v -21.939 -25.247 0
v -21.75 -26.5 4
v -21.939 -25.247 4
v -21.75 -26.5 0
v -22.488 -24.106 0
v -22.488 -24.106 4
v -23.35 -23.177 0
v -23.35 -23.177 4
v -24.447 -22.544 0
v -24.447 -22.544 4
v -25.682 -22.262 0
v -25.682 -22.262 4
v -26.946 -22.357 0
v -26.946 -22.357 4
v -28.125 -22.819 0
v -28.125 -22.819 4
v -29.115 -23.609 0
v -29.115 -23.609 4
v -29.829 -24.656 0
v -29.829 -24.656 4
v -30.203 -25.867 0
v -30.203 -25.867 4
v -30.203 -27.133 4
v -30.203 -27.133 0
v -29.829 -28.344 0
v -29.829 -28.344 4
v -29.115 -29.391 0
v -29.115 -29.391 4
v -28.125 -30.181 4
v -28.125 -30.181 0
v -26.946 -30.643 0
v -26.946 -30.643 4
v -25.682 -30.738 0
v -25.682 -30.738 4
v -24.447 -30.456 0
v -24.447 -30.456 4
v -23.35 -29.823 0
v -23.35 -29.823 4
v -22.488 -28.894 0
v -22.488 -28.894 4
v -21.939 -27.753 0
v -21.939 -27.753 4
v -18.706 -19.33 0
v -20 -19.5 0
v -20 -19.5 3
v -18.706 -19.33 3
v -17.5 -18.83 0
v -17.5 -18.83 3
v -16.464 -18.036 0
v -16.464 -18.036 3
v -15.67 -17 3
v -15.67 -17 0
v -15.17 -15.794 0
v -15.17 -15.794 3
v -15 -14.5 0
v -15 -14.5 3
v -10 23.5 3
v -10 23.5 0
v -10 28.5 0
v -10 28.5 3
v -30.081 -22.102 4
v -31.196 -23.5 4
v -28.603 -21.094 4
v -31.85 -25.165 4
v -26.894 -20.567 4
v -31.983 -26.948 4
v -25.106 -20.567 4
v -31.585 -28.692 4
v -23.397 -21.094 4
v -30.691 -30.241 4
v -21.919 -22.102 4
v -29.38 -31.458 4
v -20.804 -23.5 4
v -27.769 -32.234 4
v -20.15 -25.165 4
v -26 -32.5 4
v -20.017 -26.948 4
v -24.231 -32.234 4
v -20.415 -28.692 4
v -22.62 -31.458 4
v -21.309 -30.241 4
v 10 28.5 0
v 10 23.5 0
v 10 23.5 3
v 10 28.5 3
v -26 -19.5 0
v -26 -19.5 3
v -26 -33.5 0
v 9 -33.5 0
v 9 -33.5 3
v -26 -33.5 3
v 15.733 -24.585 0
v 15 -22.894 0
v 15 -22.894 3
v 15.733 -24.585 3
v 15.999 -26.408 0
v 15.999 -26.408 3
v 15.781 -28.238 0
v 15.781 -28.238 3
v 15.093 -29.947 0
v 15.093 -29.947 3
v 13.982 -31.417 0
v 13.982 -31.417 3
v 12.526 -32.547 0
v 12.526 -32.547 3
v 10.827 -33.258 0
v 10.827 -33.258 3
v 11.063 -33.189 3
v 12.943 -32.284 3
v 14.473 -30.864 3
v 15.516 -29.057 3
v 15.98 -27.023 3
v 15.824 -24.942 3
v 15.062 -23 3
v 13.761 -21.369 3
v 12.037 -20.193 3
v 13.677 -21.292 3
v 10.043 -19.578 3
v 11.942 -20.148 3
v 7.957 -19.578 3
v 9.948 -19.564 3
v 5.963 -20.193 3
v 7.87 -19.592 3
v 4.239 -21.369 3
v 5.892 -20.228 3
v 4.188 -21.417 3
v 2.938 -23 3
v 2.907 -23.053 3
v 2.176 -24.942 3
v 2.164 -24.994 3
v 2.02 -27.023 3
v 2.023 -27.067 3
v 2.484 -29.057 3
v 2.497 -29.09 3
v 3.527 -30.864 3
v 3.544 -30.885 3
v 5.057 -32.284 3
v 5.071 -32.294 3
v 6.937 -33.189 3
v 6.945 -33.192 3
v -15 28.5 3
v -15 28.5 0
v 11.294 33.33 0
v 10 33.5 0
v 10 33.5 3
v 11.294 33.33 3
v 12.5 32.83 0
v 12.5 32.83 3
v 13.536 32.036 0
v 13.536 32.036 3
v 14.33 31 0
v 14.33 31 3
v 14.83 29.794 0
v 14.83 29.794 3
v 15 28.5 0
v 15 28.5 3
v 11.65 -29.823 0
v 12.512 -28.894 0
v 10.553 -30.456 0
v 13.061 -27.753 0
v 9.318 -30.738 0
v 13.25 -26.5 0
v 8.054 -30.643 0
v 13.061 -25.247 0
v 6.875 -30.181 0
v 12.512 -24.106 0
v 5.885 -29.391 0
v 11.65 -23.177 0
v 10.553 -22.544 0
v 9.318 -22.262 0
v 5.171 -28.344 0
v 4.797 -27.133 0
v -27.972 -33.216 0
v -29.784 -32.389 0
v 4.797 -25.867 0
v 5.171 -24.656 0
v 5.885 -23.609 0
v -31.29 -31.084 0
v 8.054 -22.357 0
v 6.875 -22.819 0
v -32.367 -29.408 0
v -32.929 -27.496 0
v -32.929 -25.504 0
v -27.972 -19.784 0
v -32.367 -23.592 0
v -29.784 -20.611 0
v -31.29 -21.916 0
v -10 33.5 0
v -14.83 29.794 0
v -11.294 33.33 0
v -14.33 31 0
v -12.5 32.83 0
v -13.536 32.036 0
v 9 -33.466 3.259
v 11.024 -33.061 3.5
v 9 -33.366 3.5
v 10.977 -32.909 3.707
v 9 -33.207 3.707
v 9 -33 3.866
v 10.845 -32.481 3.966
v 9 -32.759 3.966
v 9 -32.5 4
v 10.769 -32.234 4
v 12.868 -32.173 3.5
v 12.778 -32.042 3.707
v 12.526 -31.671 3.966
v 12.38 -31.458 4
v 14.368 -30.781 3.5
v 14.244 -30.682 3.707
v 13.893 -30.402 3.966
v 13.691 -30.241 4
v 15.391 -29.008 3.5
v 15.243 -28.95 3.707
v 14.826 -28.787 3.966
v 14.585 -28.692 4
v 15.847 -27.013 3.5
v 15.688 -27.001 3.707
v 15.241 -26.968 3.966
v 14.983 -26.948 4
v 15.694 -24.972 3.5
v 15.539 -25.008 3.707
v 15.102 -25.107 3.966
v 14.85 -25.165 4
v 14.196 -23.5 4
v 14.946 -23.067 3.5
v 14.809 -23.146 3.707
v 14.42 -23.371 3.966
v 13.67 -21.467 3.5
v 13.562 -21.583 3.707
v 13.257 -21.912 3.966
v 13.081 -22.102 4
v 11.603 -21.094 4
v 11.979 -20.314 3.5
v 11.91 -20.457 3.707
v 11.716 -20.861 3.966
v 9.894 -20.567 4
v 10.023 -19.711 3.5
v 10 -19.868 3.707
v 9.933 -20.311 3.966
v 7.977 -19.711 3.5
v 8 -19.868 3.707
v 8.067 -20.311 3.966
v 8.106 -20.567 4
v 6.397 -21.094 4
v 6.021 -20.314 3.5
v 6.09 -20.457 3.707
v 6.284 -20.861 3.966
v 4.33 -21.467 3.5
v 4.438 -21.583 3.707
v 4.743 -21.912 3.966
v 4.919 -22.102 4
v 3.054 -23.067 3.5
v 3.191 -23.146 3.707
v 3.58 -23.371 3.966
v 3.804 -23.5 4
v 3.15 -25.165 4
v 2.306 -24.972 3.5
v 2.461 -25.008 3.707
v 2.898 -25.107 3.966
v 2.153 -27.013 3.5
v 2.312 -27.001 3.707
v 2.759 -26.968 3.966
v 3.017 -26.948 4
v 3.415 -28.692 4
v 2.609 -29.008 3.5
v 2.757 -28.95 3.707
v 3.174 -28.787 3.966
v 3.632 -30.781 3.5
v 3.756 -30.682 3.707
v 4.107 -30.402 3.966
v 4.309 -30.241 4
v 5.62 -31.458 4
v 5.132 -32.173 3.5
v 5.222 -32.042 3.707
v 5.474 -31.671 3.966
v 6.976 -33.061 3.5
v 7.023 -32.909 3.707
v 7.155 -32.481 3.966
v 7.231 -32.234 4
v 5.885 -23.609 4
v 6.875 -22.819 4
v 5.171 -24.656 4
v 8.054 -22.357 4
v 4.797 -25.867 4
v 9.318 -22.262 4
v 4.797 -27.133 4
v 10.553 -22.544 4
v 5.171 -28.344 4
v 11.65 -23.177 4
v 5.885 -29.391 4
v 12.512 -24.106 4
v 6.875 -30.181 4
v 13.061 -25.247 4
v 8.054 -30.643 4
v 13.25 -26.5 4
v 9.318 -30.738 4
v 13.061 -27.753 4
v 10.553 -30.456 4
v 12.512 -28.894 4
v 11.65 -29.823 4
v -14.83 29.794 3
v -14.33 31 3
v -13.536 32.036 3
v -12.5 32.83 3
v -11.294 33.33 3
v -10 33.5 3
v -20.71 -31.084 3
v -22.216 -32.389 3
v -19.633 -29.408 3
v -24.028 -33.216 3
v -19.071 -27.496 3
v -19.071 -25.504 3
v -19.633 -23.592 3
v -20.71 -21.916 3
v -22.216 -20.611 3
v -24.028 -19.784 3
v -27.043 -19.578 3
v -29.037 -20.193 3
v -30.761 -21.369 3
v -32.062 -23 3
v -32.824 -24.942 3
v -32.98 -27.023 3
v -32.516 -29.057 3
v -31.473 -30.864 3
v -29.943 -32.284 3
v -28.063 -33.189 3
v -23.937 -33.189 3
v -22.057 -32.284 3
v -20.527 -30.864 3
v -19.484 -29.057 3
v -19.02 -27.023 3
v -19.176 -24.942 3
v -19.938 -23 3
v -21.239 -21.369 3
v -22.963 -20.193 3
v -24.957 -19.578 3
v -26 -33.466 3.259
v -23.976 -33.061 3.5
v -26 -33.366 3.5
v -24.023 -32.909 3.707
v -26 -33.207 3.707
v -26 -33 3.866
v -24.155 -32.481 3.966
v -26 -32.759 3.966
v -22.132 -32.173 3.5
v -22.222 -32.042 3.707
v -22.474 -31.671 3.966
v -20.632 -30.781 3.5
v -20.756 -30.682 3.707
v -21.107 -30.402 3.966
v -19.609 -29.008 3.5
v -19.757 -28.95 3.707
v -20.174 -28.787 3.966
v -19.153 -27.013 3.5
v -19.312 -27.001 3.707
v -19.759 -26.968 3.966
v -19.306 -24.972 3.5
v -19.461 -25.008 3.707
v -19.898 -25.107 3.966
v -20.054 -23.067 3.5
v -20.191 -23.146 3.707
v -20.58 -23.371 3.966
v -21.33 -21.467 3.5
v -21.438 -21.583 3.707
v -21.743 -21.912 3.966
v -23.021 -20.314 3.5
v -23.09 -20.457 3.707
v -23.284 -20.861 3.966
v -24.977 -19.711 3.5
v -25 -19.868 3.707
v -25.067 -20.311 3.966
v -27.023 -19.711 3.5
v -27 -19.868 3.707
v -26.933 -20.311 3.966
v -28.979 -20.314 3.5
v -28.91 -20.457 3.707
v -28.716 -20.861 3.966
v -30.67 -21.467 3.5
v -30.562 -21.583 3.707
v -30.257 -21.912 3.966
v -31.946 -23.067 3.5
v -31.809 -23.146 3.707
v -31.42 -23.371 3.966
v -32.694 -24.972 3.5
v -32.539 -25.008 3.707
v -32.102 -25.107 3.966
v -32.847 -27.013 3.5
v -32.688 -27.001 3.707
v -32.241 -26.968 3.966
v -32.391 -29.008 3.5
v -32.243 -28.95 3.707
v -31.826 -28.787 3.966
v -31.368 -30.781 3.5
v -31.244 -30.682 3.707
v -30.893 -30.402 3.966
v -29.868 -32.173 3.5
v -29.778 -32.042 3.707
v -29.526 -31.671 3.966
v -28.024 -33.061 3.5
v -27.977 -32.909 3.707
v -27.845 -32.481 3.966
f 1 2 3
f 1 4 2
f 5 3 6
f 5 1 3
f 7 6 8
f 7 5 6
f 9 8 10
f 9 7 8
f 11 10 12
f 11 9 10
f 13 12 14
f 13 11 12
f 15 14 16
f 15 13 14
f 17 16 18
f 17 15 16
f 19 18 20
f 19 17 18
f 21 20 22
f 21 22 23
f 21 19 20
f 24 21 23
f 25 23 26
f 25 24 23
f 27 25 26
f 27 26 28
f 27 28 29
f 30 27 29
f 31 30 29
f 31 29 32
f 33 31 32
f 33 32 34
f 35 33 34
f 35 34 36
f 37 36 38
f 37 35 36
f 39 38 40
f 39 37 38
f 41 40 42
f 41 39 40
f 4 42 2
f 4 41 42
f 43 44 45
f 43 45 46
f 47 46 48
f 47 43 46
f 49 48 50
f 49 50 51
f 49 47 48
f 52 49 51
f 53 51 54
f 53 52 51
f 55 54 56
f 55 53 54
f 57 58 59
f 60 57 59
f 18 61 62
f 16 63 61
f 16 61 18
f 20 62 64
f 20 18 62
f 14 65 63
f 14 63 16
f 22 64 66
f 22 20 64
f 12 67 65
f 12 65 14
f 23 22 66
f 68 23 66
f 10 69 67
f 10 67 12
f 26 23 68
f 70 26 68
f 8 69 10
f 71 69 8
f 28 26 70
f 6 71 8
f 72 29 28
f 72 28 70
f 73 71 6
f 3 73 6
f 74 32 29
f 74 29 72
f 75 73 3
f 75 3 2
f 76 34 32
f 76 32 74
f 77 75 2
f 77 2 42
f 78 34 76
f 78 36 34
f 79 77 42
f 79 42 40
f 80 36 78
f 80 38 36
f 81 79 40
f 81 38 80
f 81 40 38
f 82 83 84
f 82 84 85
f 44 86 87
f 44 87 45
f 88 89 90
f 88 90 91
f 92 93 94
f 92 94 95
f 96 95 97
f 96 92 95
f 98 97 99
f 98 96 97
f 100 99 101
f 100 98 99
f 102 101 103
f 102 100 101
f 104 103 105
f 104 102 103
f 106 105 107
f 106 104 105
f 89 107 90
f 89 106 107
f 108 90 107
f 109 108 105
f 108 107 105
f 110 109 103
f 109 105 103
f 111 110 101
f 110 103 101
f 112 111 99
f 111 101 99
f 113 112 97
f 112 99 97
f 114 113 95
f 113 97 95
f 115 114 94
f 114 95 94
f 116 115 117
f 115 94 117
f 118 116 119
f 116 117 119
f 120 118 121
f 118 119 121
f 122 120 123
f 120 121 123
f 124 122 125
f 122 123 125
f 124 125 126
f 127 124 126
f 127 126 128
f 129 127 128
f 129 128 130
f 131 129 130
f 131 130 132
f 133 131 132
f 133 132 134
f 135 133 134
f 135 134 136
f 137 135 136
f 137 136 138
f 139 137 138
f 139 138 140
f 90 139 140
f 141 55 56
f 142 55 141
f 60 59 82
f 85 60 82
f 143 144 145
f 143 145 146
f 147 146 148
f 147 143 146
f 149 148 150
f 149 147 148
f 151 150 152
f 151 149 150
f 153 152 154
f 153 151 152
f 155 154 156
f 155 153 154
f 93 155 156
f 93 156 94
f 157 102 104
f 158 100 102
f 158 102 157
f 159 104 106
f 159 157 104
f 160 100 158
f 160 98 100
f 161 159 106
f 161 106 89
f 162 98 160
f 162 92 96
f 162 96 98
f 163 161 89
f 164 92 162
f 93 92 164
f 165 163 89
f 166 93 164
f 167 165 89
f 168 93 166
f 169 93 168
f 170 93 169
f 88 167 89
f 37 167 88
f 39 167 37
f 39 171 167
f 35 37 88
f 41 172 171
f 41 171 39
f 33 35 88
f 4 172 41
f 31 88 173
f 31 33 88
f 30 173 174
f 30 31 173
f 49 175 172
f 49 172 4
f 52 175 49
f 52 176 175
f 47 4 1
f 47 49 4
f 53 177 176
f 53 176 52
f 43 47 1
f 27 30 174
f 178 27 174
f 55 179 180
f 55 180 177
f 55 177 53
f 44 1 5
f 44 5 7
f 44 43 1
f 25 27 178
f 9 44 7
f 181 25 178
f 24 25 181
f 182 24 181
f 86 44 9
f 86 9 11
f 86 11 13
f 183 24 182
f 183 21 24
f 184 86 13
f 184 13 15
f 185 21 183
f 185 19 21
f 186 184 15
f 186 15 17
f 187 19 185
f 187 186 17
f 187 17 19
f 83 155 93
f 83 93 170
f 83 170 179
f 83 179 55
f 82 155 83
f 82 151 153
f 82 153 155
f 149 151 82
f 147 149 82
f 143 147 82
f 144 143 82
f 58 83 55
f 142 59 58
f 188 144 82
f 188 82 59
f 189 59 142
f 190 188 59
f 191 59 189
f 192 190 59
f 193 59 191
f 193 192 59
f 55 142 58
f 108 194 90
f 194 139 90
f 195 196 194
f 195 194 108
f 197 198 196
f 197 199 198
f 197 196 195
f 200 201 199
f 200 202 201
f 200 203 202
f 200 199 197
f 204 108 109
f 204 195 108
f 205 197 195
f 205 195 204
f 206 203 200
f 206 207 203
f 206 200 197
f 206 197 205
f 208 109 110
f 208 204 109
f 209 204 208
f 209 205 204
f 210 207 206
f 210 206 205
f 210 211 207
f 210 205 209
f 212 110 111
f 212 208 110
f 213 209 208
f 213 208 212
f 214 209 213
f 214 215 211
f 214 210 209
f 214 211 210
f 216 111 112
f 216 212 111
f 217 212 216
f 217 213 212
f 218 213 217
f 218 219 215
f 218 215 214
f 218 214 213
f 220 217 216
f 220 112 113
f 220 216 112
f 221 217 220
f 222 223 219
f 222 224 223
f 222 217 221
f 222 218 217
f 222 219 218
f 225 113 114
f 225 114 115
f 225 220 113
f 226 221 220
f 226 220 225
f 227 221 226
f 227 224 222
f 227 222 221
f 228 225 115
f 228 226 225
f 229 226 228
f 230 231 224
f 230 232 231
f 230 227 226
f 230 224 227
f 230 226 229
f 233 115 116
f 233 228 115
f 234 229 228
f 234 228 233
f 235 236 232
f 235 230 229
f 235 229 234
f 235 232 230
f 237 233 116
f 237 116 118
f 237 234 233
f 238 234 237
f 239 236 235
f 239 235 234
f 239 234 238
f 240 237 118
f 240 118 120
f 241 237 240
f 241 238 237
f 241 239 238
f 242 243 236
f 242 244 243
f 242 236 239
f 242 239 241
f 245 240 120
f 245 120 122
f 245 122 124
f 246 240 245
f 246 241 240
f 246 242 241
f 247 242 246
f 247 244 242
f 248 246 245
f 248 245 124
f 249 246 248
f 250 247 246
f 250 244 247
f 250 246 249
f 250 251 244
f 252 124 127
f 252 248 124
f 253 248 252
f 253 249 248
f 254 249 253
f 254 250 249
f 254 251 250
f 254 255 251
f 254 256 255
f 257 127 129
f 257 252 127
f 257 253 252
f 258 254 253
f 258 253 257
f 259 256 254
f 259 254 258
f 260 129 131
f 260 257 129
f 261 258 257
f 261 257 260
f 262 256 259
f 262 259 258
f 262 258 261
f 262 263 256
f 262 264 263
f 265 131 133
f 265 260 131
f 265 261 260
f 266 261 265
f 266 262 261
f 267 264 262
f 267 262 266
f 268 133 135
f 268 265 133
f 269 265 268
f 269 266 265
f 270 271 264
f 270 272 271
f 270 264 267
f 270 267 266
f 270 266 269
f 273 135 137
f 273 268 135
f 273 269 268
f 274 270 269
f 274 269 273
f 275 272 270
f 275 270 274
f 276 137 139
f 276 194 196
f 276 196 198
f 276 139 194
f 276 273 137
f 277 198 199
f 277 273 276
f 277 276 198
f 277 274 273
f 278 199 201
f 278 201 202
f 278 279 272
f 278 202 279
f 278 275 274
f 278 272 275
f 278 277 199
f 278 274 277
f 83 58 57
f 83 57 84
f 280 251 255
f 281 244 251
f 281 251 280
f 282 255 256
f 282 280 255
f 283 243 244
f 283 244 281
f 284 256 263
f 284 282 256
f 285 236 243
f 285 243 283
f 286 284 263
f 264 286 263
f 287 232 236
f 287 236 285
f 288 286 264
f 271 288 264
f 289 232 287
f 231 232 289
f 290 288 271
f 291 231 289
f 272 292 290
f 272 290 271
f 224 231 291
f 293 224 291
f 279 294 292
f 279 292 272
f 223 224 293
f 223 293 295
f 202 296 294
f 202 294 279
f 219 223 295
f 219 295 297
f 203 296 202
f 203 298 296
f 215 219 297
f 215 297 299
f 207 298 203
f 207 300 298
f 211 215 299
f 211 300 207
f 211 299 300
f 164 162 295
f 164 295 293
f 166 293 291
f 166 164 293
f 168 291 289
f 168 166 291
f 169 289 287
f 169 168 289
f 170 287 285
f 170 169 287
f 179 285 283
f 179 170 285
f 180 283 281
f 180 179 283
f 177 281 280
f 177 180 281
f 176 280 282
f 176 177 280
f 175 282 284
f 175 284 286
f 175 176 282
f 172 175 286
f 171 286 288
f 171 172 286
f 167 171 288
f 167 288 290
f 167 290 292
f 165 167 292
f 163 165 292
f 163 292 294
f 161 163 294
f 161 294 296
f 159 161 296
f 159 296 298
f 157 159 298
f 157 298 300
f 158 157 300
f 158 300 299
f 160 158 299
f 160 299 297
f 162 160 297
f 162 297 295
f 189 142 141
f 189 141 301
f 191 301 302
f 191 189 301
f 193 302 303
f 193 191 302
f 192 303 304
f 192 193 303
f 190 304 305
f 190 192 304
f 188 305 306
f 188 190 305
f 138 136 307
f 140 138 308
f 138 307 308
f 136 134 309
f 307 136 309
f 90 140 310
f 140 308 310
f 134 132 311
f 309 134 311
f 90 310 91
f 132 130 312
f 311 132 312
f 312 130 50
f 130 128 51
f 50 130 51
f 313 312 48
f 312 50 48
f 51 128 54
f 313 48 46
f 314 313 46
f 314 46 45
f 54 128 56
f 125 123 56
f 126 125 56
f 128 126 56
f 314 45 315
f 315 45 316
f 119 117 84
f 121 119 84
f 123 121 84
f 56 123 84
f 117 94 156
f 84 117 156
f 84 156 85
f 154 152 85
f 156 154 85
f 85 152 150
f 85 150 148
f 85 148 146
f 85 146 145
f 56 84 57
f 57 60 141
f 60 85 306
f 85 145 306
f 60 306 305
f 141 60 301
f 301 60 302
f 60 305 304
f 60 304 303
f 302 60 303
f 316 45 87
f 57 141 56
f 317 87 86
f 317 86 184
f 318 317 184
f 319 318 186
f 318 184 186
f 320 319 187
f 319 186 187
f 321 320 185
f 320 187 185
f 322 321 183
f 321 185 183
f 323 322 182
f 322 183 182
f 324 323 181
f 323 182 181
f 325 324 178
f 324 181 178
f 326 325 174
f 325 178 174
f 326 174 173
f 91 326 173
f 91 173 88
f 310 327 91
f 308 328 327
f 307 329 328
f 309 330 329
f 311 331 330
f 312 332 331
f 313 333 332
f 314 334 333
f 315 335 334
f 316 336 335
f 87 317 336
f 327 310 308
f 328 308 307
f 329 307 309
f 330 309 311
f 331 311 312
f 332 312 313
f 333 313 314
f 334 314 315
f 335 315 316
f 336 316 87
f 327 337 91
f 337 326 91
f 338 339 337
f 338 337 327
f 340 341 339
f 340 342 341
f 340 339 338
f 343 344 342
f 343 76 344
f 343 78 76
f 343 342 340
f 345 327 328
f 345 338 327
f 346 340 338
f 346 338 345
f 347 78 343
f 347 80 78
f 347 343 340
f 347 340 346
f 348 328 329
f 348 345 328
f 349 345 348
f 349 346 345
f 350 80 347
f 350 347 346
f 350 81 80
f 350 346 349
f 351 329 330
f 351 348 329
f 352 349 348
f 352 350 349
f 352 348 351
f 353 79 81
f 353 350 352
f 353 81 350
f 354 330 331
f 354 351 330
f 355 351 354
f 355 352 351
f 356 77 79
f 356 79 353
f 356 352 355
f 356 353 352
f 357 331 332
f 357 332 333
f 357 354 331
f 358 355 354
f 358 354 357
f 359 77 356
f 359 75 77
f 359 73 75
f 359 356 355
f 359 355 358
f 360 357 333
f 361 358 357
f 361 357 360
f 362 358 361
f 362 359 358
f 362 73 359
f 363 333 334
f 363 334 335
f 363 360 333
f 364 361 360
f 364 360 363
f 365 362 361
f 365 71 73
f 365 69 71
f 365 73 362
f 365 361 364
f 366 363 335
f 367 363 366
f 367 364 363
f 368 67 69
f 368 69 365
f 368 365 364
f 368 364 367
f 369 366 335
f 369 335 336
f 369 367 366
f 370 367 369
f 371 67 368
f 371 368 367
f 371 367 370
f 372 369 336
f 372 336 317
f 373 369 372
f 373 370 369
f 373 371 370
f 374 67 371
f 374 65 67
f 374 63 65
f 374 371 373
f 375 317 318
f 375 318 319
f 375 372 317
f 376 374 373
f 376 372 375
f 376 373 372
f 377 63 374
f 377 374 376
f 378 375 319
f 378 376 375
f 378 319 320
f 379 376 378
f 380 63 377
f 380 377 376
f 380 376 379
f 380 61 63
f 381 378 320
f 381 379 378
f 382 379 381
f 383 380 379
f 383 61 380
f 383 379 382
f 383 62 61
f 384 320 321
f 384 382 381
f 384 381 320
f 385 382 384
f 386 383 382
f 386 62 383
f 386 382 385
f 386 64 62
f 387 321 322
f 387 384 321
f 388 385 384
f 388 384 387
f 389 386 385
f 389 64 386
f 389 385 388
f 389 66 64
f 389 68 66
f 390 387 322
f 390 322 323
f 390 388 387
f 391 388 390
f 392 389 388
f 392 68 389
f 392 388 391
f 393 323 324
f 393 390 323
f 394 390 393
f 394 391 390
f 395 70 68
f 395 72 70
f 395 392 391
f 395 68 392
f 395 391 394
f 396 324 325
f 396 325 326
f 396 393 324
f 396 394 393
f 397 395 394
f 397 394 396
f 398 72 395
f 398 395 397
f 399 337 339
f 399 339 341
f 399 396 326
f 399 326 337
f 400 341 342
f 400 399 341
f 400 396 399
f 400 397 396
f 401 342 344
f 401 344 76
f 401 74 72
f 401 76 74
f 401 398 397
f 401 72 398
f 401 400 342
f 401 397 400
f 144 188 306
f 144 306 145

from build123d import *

# Parameters (mm, degrees)
SKETCH1_R           = 4.25
SKETCH1_W           = 20
SKETCH1_H           = 5
BOSS_EXTRUDE1_DEPTH = 3
SKETCH2_R           = 7
SKETCH2_R_2         = 4.25
BOSS_EXTRUDE2_DEPTH = 1
FILLET1_R           = 1


with BuildPart() as part:
    # Sketch1 → Boss-Extrude1 (new body)
    with BuildSketch(Plane.XY):
        with BuildLine():
            Line((9, -33.5), (-26, -33.5))
            ThreePointArc((-26, -33.5), (-33, -26.5), (-26, -19.5))
            Line((-26, -19.5), (-20, -19.5))
            ThreePointArc((-20, -19.5), (-16.464466094, -18.035533906), (-15, -14.5))
            Line((-15, -14.5), (-15, 28.5))
            ThreePointArc((-15, 28.5), (-13.535533906, 32.035533906), (-10, 33.5))
            Line((-10, 33.5), (10, 33.5))
            ThreePointArc((10, 33.5), (13.535533906, 32.035533906), (15, 28.5))
            Line((15, 28.5), (15, -22.894448725))
            ThreePointArc((15, -22.894448725), (15.092571663, -29.946820352), (9, -33.5))
        make_face()
        with Locations((9, -26.5)):
            Circle(SKETCH1_R, mode=Mode.SUBTRACT)
        with Locations((-26, -26.5)):
            Circle(SKETCH1_R, mode=Mode.SUBTRACT)
        with Locations((0, 26)):
            Rectangle(SKETCH1_W, SKETCH1_H, mode=Mode.SUBTRACT)
    extrude(amount=BOSS_EXTRUDE1_DEPTH)

    # Sketch2 → Boss-Extrude2 (add)
    # profile 1 of 2: a face of its own
    with BuildSketch(Plane.XY.offset(3)):
        with Locations(Location((-26, -26.5, 0), (0, 0, 270))):
            Circle(SKETCH2_R)
        with Locations((-26, -26.5)):
            Circle(SKETCH2_R_2, mode=Mode.SUBTRACT)
    # profile 2 of 2: a face of its own
    with BuildSketch(Plane.XY.offset(3)):
        with Locations(Location((9, -26.5, 0), (0, 0, 270))):
            Circle(SKETCH2_R)
        with Locations((9, -26.5)):
            Circle(SKETCH2_R_2, mode=Mode.SUBTRACT)
    extrude(amount=BOSS_EXTRUDE2_DEPTH)

    # Fillet1
    fillet1_edges = [part.edges().sort_by_distance(p)[0] for p in [
        (-26, -19.5, 4),
        (9, -19.5, 4),
    ]]
    fillet(fillet1_edges, radius=FILLET1_R - 0.0001)  # a hair under: the kernel refuses the full size


solid = part.part
